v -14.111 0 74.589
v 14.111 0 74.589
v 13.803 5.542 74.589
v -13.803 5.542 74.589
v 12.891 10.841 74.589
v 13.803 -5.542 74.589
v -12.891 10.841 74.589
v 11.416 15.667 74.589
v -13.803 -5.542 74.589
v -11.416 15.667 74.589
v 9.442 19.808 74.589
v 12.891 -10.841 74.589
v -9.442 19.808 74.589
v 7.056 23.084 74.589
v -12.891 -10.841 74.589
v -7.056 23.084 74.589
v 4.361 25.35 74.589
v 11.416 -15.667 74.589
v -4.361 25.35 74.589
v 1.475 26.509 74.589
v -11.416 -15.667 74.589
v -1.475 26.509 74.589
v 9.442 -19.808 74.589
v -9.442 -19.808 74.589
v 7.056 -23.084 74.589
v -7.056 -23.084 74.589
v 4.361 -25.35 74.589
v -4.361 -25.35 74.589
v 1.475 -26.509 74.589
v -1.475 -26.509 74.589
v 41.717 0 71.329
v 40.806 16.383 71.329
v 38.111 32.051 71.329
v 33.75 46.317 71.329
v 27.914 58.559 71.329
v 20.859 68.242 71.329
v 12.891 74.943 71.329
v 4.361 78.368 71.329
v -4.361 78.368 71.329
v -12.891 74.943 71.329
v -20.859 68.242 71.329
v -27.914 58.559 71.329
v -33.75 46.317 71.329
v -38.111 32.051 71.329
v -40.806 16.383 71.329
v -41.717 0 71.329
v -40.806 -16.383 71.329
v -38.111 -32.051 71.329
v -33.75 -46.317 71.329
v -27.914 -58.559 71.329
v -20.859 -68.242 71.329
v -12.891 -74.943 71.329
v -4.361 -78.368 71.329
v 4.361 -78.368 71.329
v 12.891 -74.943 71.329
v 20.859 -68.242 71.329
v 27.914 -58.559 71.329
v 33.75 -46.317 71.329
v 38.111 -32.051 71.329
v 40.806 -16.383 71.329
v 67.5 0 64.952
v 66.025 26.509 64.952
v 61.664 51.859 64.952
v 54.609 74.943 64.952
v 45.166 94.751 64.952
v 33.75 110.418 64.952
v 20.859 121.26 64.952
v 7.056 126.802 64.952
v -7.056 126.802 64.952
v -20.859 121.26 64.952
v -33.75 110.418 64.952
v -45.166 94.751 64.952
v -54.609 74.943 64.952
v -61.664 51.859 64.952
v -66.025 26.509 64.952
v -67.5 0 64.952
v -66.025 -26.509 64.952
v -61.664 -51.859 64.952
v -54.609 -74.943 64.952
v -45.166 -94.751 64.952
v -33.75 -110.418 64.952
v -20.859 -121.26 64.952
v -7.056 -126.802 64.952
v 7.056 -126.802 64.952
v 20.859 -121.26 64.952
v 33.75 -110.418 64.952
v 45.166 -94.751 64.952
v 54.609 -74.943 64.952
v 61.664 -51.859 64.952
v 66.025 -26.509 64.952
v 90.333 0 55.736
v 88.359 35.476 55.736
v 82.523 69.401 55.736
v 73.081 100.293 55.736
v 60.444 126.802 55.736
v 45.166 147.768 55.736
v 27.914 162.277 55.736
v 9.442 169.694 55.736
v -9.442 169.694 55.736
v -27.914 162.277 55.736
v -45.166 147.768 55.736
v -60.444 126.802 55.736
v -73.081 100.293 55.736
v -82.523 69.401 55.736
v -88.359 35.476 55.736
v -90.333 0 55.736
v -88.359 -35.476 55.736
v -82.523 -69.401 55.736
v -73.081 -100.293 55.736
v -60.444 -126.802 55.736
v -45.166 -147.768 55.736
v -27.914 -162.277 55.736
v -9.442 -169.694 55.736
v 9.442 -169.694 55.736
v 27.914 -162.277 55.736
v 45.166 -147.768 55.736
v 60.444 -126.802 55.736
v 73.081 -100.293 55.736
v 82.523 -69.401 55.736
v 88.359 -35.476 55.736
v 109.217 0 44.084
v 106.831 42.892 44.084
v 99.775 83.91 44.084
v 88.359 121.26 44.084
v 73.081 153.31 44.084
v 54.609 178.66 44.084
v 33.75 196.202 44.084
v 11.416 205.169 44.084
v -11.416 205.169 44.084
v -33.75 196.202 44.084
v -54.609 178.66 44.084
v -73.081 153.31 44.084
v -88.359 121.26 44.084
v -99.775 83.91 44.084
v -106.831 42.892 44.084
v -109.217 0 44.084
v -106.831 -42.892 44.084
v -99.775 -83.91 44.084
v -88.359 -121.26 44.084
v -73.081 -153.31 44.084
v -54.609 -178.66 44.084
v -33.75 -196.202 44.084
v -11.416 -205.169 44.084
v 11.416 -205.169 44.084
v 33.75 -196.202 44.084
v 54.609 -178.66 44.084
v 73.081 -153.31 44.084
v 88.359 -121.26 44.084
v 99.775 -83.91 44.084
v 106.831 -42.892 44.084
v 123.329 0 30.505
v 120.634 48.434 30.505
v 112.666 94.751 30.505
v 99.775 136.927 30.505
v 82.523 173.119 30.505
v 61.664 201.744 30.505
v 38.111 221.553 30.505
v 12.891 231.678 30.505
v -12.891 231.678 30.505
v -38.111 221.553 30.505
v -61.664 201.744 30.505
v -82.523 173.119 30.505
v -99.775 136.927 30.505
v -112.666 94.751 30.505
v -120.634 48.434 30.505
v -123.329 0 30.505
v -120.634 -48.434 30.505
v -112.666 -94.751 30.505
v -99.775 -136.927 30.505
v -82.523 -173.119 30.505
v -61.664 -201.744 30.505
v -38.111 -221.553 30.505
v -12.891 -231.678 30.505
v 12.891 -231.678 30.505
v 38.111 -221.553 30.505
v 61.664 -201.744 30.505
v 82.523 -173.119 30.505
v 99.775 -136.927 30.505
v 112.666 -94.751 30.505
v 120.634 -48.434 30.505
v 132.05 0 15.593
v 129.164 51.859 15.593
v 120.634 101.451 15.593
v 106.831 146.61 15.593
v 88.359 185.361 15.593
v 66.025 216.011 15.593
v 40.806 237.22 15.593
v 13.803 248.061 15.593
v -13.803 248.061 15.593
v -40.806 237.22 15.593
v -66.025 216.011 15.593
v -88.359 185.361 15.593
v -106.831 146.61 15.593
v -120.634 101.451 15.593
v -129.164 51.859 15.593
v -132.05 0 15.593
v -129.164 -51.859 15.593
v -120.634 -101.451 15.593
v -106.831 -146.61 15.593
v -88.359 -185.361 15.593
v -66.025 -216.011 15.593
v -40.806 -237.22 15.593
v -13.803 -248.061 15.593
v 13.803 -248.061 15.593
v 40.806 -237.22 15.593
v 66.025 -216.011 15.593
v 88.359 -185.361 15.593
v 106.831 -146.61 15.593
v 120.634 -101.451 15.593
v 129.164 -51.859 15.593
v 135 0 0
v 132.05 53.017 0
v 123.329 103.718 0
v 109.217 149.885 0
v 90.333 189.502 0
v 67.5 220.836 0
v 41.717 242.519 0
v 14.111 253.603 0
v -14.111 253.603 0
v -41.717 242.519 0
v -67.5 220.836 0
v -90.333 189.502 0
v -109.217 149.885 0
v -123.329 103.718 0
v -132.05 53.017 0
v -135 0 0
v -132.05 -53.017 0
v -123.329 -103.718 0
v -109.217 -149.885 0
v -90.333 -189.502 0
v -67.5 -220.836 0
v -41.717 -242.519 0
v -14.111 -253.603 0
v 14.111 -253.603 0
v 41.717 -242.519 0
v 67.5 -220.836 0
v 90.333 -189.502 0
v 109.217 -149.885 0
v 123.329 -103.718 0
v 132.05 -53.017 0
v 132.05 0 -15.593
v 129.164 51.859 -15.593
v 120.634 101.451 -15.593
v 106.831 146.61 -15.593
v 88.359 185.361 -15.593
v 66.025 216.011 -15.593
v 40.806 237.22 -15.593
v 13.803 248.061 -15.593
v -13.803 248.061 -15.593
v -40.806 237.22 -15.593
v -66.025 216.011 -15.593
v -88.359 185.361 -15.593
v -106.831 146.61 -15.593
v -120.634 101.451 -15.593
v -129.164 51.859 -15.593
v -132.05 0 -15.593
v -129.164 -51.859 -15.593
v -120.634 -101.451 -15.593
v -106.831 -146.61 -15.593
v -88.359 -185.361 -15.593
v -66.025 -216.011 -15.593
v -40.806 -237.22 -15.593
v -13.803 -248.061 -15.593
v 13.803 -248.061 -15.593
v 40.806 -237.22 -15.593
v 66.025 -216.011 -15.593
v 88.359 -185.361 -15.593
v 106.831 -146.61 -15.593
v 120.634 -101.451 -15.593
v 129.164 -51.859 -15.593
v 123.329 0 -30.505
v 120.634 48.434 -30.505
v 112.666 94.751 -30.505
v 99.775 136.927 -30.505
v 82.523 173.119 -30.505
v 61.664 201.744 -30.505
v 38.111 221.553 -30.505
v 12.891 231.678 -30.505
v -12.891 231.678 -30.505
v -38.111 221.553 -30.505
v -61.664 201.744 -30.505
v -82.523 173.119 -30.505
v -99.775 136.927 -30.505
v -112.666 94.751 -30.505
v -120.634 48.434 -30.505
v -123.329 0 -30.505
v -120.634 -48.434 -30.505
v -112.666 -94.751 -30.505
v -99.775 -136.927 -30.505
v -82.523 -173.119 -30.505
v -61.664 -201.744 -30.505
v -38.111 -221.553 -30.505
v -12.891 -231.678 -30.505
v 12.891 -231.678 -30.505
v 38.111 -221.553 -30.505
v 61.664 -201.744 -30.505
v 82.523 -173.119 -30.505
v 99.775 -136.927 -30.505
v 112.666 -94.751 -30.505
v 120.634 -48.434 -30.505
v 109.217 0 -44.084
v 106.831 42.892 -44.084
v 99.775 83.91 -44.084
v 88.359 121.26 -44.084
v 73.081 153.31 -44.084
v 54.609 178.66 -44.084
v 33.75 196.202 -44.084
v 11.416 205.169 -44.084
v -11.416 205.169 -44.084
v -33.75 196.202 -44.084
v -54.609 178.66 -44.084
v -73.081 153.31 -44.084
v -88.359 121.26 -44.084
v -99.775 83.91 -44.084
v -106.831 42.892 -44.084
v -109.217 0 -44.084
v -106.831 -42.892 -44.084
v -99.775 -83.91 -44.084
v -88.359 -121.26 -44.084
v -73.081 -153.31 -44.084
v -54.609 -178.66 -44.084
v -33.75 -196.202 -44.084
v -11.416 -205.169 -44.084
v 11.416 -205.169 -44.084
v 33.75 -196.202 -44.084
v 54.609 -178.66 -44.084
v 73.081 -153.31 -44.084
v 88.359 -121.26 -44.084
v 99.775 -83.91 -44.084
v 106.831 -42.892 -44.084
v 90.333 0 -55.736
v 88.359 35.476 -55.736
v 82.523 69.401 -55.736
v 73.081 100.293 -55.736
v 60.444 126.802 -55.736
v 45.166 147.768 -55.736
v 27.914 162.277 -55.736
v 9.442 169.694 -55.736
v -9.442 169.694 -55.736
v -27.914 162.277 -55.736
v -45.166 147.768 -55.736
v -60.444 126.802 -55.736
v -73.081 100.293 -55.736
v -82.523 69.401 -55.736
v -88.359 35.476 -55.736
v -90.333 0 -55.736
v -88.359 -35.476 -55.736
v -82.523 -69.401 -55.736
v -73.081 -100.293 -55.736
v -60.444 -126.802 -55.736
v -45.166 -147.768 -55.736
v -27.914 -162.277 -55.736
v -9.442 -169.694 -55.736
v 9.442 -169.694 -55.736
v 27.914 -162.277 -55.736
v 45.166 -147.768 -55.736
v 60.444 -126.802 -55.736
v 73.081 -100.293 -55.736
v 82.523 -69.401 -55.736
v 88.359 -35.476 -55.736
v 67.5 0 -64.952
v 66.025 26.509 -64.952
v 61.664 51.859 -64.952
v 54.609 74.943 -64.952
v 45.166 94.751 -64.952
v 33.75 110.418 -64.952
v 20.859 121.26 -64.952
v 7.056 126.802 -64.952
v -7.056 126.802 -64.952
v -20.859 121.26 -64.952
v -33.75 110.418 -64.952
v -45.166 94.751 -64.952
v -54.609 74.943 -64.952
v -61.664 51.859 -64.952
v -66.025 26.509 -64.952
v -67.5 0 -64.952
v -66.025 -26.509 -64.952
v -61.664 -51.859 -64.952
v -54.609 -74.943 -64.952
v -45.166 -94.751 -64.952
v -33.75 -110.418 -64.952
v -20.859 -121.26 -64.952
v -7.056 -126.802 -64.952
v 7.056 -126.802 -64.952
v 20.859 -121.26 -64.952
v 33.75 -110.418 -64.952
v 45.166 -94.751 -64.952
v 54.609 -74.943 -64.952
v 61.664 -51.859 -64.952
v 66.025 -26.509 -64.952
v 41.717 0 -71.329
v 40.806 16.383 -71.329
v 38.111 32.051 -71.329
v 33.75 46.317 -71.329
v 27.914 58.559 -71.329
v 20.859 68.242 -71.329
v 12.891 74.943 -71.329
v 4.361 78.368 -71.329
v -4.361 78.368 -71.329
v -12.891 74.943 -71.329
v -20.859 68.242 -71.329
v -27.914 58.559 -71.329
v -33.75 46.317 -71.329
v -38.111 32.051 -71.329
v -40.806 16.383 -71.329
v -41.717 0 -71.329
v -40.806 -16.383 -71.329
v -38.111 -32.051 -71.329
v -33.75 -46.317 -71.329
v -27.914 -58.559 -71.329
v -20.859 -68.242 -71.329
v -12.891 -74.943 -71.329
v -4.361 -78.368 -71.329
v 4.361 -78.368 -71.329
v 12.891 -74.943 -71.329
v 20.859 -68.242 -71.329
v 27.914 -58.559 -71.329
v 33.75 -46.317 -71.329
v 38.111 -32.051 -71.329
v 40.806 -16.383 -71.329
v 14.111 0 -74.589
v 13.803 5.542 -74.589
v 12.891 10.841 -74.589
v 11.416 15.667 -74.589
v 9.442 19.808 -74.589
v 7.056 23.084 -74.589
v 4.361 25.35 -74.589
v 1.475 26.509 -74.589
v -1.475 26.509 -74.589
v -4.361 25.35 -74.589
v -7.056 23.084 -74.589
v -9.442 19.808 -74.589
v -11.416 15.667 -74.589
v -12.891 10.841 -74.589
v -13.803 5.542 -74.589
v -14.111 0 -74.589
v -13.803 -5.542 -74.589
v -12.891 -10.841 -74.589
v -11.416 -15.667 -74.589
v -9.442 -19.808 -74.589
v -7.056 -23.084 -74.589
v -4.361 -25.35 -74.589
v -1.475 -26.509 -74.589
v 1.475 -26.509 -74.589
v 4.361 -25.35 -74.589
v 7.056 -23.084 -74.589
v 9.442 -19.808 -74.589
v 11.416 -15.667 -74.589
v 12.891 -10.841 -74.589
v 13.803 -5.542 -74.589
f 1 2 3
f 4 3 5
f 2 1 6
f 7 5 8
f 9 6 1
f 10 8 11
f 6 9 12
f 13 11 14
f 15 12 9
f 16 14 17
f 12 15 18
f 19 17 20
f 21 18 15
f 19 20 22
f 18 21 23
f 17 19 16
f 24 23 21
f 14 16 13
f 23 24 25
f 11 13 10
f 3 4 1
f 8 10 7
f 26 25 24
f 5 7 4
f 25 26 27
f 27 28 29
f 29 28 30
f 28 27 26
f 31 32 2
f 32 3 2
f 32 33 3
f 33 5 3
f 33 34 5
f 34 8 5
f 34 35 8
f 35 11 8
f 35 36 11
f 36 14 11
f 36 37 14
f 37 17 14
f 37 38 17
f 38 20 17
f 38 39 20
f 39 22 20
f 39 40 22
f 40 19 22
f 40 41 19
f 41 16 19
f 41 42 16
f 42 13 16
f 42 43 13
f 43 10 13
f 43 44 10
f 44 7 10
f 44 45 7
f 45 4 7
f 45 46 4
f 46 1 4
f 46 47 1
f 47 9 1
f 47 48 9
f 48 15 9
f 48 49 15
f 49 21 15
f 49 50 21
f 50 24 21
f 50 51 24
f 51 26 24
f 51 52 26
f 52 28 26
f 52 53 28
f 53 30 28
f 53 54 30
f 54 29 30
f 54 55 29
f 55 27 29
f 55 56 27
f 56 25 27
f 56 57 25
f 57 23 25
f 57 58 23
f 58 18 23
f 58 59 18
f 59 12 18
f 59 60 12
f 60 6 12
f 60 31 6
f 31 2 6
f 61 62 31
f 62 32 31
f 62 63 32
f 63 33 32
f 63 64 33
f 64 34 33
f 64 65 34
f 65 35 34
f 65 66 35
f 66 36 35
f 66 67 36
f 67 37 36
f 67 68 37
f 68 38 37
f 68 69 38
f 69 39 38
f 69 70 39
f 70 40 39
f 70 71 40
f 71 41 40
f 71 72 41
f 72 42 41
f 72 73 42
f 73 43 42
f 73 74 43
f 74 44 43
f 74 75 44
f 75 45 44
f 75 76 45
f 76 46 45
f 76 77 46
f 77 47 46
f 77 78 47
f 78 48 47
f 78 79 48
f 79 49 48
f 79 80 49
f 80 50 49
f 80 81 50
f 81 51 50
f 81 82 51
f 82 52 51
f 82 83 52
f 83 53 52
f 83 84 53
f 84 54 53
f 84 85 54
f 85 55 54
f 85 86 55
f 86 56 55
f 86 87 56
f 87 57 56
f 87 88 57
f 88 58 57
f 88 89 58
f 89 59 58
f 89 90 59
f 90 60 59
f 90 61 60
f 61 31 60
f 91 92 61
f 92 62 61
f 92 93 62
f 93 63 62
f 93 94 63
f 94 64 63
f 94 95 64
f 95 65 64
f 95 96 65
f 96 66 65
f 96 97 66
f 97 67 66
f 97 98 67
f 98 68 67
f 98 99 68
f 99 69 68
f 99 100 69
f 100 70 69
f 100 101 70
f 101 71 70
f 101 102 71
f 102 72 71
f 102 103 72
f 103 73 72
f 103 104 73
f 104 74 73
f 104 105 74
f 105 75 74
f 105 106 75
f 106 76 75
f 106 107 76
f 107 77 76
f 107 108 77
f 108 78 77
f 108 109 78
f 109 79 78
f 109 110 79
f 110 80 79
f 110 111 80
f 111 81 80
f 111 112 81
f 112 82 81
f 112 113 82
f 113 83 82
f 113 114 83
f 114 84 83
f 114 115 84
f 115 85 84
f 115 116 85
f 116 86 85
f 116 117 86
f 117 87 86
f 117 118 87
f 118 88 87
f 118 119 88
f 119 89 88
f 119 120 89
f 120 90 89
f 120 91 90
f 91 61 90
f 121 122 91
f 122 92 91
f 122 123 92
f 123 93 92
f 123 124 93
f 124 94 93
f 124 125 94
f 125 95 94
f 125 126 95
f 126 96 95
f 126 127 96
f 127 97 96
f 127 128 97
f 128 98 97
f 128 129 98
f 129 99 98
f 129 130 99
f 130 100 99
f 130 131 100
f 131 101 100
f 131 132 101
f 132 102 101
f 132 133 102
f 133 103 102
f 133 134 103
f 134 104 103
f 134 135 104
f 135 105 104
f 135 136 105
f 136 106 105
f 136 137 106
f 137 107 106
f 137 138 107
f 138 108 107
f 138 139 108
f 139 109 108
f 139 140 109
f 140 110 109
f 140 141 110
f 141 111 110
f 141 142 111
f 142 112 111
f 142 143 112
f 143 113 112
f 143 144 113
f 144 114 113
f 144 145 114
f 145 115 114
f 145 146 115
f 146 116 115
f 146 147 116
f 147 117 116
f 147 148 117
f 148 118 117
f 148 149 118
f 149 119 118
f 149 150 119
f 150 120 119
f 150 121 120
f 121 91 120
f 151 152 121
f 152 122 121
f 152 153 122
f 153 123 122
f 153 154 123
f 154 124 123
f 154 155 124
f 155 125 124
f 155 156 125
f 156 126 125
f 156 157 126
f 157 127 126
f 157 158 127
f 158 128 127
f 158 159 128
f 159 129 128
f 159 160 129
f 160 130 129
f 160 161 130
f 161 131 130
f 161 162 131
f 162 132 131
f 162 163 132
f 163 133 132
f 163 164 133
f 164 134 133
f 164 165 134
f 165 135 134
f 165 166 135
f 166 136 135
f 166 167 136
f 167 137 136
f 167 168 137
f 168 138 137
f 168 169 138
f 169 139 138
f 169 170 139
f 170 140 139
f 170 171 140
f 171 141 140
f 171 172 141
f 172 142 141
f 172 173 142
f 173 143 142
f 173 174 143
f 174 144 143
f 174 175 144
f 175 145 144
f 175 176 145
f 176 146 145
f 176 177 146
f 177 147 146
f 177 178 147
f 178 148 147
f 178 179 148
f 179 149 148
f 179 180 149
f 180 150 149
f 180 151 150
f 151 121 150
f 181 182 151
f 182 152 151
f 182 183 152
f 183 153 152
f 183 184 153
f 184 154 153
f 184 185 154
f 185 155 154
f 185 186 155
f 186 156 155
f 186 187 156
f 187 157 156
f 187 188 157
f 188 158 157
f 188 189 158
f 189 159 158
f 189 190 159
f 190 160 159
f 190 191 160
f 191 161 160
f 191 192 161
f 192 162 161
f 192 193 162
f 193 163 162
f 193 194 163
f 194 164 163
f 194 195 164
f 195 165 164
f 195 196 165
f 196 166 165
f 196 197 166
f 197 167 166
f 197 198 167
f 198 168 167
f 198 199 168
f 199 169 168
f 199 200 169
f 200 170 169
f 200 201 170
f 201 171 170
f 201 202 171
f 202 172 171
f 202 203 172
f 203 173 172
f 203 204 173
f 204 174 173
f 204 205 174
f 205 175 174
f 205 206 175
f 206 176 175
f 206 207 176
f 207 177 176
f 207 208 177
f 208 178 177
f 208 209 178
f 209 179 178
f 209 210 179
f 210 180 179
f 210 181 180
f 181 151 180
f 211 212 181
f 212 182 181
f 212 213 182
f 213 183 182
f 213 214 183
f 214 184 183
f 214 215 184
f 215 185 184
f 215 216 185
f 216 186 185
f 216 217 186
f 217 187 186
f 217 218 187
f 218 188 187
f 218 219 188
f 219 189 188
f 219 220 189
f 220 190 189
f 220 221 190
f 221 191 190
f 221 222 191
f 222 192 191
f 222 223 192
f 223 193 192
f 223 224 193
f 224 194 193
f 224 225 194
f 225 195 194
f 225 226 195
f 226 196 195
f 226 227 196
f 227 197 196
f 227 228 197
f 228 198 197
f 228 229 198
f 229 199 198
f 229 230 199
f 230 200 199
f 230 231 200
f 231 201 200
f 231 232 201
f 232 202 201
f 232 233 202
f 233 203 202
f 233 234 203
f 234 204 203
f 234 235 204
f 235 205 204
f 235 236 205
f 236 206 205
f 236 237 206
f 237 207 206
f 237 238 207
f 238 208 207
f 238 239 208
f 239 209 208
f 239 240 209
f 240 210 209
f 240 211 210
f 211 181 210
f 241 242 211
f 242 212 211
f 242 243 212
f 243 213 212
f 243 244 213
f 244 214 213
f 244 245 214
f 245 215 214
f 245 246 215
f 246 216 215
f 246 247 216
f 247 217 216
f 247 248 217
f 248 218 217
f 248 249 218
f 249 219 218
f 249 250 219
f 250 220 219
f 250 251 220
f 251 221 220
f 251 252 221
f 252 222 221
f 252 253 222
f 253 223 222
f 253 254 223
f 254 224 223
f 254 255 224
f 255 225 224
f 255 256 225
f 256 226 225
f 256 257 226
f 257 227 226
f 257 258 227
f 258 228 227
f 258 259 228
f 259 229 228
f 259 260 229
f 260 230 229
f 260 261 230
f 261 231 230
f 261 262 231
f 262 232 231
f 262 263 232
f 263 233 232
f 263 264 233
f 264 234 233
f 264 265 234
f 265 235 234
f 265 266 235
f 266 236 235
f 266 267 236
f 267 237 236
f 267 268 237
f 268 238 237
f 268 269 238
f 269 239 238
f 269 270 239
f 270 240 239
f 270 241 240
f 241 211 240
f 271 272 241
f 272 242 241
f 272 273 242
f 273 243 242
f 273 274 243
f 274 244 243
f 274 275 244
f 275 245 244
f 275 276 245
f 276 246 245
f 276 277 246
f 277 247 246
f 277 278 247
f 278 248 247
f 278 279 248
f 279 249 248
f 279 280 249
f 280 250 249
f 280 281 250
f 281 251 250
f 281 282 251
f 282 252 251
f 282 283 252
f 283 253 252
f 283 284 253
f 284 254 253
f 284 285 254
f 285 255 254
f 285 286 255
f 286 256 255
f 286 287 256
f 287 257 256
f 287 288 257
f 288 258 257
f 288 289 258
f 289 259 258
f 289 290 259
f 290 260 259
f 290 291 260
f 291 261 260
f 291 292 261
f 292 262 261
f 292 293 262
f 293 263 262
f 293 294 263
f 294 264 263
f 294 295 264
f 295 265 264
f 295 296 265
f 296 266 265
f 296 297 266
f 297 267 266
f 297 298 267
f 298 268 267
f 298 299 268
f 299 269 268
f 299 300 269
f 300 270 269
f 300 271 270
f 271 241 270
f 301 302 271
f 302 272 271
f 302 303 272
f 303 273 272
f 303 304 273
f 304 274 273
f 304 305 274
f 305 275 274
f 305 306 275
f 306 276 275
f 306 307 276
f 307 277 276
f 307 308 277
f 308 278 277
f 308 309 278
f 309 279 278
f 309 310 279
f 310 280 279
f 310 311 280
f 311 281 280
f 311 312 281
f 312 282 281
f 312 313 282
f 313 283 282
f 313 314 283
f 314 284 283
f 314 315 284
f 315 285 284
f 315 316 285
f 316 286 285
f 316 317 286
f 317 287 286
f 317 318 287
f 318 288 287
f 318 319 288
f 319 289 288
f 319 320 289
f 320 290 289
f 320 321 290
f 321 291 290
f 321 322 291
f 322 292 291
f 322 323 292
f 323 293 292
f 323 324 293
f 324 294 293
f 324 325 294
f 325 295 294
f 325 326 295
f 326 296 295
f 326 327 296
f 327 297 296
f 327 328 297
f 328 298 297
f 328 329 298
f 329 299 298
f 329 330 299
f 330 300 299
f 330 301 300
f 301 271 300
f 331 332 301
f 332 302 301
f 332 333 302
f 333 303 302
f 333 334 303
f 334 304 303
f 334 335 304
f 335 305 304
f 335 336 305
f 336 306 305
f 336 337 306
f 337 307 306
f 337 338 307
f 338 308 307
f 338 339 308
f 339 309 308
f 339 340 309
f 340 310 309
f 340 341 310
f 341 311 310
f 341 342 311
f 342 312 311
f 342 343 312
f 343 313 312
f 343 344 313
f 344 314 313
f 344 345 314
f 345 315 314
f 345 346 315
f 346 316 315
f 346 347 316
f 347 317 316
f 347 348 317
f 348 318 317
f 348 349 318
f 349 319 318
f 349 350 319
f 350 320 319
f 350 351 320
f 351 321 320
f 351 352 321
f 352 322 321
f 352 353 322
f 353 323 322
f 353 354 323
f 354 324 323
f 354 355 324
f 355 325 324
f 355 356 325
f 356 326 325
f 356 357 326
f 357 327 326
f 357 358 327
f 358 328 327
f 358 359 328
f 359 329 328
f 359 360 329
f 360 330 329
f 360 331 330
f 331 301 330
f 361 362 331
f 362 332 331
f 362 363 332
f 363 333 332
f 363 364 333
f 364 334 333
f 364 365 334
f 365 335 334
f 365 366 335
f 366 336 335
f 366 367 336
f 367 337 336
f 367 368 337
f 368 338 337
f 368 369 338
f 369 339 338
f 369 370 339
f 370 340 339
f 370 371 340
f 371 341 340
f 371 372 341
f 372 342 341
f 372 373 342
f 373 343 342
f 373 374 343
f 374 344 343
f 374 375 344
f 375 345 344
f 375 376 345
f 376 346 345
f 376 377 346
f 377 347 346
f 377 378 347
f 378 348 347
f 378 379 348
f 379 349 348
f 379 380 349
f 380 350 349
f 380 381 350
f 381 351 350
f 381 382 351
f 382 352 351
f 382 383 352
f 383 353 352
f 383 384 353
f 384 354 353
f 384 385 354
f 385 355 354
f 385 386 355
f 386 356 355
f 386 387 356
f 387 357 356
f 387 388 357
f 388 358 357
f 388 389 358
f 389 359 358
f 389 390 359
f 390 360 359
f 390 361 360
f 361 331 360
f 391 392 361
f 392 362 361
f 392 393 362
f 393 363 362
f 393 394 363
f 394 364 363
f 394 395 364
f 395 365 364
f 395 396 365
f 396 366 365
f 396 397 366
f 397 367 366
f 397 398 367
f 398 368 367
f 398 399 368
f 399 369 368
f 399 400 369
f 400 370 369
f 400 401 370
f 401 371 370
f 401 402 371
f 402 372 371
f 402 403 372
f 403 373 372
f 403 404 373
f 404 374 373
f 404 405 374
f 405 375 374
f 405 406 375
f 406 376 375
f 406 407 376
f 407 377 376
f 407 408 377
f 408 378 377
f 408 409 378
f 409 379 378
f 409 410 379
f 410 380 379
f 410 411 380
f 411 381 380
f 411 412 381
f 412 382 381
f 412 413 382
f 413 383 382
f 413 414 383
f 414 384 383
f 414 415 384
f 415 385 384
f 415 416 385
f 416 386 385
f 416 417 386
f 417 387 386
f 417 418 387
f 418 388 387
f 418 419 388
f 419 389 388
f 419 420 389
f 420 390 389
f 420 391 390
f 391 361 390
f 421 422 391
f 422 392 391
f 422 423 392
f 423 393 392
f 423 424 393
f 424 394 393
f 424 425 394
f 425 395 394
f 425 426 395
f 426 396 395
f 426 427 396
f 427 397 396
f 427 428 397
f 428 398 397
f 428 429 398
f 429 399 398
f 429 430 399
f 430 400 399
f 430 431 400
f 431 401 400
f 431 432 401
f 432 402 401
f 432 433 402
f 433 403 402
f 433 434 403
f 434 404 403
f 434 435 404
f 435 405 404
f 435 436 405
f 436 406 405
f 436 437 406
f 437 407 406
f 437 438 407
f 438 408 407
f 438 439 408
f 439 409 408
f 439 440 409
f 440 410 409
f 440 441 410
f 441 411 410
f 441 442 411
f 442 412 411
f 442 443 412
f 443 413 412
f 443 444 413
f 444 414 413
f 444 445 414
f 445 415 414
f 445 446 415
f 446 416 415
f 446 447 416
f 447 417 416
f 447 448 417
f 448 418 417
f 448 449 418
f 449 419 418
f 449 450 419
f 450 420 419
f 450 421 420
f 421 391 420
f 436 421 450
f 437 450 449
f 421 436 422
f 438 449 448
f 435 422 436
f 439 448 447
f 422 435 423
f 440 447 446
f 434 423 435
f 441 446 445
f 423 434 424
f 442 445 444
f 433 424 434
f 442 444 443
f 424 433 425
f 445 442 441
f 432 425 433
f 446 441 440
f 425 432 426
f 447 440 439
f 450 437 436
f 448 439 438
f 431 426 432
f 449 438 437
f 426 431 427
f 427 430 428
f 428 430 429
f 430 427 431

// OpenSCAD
// Generated by SolidPython 1.0.1 on 2020-07-29 00:46:49


scale(v = [9, 17, 5]) {
	sphere(r = 15);
}
/***********************************************
*********      SolidPython code:      **********
************************************************
 
# import packages: SolidPython
from solid import *
from solid.utils import *
from itertools import chain, combinations, permutations


class Resize:

    def __init__(self, scad_file):
        self.scad_file = scad_file
        #self.scad_file = import_scad(scad_file)
        # cone/cylinder param:
        self.r1 = 0
        self.r2 = 0
        self.h = 0
        # rectangular prism param:
        self.w = 0
        self.l = 0
        # ellipse param:
        self.r = 0

    # import OpenScad code (file name corresponds to shape)


    # classify shape + parameters
    def assign(self, param1, param2, param3):
        if self.scad_file == 'cone.scad':
            self.r1 = param1
            self.r2 = param2
            self.h = param3
        elif self.scad_file == 'cylinder.scad':
            self.r1 = param1
            self.r2 = param2
            self.h = param3
        elif self.scad_file == 'rectangularPrism.scad':
            self.h = param1
            self.l = param2
            self.w = param3
        else:
            self.r = param1
            self.h = param2

    # resize parameters
    def iterate(self):
        x = range(3, 20, 2)
        i = 1
        if self.scad_file == 'cone.scad':
            tempList = list(permutations(x, 2))
            for temp in tempList:
                param1 = temp[0]
                param2 = temp[1]
                filepath = 'produced_scad_files/' + 'cone' + str(param1) + '_' + str(param2) + '_' + '.scad'
                scad_render_to_file(cylinder(h=param1, r1=param2, r2=0), filepath)

        elif self.scad_file == 'cylinder.scad':
            tempList = list(permutations(x, 3))
            for temp in tempList:
                param1 = temp[0]
                param2 = temp[1]
                filepath = 'produced_scad_files/' + 'cylinder' + str(param1) + '_' + str(param2) + '_' + '.scad'
                scad_render_to_file(cylinder(h=param1, r1=param2, r2=param2), filepath)

        elif self.scad_file == 'rectangularPrism.scad':
            tempList = list(permutations(x, 3))
            for temp in tempList:
                param1 = temp[0]
                param2 = temp[1]
                param3 = temp[2]
                filepath = 'produced_scad_files/' + 'rectangularPrism' + str(param1) + '_' + str(param2) + '_' + str(
                    param3) + '.scad'
                scad_render_to_file(cube(size=(param1, param2, param3)), filepath)

        elif self.scad_file == 'ellipse.scad':
            tempList = list(permutations(x, 4))
            for temp in tempList:
                param1 = temp[0]
                param2 = temp[1]
                param3 = temp[2]
                param4 = temp[3]
                filepath = 'produced_scad_files/' + 'ellipse' + str(param1) + '_' + str(param2) + '_' + str(param3) + '_' + str(param4) + '.scad'
                scad_render_to_file(scale([param1, param2, param3])(sphere(r=param4)), filepath)

    def render_to_scadfile(self):
        scad_render_to_file(scad, 'example.scad') 
 
************************************************/
